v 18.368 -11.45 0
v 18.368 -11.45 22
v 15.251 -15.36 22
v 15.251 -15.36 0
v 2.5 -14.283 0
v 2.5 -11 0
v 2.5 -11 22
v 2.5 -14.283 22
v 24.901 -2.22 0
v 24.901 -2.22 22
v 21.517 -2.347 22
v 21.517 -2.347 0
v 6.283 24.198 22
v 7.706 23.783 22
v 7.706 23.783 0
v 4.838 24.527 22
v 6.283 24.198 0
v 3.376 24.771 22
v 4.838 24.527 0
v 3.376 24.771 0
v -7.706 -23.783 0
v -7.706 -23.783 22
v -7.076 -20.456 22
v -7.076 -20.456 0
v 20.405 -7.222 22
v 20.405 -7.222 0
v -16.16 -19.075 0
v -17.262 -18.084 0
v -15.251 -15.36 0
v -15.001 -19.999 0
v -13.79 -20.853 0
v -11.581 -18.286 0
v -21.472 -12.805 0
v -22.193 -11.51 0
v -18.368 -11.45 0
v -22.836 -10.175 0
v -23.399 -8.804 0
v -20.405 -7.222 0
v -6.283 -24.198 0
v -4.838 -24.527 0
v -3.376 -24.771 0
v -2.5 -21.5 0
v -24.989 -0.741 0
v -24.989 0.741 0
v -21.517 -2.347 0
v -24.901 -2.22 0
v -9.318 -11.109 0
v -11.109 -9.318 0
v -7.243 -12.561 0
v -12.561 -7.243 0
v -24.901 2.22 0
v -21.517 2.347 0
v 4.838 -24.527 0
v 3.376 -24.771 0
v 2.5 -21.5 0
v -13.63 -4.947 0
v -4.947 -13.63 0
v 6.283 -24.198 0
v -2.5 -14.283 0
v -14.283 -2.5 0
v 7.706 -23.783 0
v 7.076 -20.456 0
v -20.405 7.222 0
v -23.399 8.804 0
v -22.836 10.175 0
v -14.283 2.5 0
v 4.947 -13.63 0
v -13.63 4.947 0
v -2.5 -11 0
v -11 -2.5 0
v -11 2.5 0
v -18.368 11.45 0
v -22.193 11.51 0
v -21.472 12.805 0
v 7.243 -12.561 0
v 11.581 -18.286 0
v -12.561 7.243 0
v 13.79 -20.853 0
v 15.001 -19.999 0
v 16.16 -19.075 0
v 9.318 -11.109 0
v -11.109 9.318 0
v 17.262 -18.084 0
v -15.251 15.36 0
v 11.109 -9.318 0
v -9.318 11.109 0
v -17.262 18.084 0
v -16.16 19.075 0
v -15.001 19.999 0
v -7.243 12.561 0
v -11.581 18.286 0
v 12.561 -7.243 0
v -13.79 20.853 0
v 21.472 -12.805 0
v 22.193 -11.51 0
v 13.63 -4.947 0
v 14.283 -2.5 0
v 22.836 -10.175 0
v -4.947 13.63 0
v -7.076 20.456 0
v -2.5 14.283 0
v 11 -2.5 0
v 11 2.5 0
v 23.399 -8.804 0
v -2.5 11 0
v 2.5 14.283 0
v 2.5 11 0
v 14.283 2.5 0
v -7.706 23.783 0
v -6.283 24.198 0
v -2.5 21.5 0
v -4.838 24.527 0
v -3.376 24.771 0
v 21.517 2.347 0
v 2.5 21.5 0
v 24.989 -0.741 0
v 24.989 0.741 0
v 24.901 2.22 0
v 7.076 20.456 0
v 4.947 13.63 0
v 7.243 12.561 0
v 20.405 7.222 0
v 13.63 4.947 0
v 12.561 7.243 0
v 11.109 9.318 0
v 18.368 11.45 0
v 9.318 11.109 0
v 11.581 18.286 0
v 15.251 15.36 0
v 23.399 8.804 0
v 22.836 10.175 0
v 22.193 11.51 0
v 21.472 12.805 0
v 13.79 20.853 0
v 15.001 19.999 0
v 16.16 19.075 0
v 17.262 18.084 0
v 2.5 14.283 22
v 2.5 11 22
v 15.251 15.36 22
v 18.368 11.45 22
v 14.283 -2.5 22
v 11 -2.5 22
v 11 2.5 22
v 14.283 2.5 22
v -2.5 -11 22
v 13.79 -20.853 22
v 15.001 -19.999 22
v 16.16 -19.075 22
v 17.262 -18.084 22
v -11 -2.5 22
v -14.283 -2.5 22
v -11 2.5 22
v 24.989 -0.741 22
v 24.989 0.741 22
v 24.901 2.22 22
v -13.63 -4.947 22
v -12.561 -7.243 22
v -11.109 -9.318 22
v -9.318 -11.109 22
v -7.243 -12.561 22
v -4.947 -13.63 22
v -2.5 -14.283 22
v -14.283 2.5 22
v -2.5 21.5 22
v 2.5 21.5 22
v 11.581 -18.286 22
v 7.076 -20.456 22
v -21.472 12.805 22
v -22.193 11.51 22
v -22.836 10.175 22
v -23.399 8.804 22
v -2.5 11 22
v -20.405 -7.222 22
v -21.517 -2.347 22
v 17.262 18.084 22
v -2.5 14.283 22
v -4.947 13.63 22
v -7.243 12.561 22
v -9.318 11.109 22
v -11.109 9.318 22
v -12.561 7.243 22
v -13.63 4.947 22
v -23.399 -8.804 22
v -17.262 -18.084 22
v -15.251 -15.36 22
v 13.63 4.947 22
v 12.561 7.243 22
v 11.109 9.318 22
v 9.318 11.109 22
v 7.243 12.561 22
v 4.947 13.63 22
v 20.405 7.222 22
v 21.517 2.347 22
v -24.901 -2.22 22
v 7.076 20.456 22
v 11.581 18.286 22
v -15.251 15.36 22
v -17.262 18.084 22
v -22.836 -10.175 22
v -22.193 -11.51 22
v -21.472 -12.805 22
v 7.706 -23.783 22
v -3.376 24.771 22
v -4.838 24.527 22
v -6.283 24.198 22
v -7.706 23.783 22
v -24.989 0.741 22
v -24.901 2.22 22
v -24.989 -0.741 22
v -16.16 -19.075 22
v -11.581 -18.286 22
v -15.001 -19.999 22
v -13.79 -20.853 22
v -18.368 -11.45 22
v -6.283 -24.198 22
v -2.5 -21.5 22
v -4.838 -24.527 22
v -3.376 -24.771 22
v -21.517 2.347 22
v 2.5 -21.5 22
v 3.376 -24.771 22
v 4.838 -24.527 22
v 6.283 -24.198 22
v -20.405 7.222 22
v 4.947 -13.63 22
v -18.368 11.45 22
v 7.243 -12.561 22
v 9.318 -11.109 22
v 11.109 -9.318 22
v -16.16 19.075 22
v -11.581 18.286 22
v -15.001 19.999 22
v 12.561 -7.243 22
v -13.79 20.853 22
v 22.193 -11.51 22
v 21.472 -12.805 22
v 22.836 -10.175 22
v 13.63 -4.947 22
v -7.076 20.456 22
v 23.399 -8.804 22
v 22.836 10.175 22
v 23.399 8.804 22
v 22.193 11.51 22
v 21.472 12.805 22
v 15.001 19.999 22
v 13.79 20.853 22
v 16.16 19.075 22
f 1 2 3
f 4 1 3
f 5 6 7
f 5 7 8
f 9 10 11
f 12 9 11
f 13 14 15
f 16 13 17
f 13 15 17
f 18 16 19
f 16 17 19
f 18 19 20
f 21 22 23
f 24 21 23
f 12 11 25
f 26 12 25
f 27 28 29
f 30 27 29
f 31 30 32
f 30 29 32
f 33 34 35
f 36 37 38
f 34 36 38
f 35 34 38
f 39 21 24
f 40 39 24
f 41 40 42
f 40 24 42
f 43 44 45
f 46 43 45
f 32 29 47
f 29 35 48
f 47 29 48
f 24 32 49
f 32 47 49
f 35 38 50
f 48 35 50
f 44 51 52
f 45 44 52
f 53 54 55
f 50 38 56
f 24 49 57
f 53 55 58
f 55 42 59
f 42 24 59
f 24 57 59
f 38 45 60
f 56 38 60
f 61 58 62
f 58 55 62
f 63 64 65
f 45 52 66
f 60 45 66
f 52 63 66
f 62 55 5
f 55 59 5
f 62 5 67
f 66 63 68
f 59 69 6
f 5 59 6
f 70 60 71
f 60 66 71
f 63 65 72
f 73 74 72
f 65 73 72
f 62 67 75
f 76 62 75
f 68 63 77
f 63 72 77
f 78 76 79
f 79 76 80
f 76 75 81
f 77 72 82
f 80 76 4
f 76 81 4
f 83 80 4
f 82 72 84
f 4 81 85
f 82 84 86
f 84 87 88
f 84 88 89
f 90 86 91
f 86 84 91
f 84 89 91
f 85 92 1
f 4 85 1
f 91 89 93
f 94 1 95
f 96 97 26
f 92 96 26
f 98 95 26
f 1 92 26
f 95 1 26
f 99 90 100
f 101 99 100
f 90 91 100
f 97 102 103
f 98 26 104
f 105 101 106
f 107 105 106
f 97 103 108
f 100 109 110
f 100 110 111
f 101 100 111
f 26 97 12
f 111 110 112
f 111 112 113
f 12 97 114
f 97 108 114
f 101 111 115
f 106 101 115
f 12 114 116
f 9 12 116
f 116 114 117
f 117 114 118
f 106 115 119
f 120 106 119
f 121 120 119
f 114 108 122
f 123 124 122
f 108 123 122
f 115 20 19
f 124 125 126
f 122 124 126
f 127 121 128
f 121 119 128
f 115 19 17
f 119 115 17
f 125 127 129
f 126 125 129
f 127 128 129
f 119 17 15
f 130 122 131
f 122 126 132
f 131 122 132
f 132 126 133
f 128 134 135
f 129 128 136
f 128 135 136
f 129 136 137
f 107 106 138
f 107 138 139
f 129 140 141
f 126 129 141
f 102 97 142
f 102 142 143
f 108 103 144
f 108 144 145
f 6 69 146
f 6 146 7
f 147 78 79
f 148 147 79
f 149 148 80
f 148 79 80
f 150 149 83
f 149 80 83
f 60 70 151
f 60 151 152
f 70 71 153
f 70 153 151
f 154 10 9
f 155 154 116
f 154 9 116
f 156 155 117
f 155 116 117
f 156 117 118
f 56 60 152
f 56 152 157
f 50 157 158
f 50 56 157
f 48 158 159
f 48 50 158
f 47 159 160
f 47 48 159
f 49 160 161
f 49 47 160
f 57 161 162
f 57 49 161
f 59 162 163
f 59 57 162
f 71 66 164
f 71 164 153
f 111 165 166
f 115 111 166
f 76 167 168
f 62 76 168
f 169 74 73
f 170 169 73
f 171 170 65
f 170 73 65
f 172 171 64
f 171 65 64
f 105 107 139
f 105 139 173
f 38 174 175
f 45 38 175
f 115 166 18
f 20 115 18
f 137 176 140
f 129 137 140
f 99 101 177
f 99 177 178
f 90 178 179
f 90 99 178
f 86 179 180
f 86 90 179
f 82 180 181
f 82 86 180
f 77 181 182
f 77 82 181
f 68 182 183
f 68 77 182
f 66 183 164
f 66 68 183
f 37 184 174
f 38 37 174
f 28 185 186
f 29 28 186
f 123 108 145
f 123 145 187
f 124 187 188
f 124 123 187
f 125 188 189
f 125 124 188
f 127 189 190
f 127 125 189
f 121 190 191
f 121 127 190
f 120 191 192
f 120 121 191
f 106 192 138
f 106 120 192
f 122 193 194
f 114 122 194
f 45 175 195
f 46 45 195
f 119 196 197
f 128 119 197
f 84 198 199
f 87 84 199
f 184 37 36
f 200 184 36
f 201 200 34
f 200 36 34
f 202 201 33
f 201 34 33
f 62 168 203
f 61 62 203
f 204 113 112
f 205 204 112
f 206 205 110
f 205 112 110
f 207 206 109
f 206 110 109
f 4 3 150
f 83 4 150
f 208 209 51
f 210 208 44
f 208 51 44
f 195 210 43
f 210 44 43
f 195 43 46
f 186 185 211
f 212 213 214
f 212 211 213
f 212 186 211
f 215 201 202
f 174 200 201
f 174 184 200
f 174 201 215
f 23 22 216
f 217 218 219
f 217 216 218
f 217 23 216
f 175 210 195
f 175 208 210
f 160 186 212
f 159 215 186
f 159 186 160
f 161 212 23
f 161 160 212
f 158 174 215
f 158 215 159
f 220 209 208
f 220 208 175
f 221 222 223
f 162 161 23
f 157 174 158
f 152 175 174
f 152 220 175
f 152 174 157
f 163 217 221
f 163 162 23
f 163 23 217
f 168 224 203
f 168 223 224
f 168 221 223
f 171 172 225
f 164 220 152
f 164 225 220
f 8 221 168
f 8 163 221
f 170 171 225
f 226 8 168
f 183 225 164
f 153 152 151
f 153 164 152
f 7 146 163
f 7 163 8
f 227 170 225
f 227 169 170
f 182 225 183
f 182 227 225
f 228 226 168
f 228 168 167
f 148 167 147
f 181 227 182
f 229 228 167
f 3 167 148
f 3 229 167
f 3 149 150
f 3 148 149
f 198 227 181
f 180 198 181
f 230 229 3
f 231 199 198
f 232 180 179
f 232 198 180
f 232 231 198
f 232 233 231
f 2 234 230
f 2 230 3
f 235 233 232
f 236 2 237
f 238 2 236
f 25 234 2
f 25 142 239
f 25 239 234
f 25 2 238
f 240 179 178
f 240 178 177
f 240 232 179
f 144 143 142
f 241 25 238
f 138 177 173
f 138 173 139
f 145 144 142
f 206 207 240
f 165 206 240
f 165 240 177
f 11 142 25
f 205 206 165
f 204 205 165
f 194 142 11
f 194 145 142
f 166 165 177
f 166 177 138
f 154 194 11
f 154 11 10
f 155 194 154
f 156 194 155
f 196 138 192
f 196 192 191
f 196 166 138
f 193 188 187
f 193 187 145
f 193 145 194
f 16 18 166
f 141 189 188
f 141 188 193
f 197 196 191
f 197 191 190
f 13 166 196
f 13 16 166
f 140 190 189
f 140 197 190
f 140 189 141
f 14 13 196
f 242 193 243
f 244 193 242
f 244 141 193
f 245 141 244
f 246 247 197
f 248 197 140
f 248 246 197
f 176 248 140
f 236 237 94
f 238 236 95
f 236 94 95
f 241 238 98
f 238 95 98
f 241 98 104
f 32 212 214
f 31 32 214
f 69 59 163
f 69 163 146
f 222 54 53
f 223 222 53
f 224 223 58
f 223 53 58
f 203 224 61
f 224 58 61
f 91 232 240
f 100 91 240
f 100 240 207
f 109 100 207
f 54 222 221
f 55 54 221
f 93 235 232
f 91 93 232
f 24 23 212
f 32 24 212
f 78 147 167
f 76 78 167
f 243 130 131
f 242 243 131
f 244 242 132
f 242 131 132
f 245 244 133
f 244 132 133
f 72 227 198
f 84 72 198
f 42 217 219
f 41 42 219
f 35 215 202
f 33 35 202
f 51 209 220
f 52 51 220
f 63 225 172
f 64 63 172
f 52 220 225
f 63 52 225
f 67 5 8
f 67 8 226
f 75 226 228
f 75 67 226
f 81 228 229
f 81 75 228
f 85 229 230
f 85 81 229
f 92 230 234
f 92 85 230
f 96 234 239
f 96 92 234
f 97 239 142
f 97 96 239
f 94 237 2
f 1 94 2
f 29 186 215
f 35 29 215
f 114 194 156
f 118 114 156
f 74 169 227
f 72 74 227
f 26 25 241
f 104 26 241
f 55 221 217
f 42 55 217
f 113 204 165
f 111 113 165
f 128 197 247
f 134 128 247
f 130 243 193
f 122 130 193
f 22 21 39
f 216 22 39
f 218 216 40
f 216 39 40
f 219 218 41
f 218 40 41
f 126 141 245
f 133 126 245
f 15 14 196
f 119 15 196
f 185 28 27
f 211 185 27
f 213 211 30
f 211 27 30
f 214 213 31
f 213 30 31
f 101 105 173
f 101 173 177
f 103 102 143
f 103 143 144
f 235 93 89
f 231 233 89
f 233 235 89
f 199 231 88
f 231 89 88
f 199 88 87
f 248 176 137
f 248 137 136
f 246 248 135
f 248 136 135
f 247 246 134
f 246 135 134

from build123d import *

# Parameters (mm, degrees)
ESBO_O1_R                  = 25
RESSALTO_EXTRUS_O1_DEPTH   = 22
CORTE_EXTRUS_O1_DEPTH      = 24
CORTE_EXTRUS_O1_DEPTH_BACK = 32
CORTE_EXTRUS_O2_DEPTH      = 32
PADR_OCIRCULAR1_COUNT      = 14


with BuildPart() as part:
    # Esboço1 → Ressalto-extrusão1 (new body)
    with BuildSketch(Plane.XY):
        Circle(ESBO_O1_R)
    extrude(amount=RESSALTO_EXTRUS_O1_DEPTH)

    # Esboço2 → Corte-extrusão1 (cut, two sides: drawn at the far end of the back side and taken through both)
    with BuildSketch(Plane.XY.offset(22).offset(-CORTE_EXTRUS_O1_DEPTH_BACK)):
        with BuildLine():
            Line((-2.5, -11), (2.5, -11))
            Line((2.5, -11), (2.5, -14.282856857))
            ThreePointArc((2.5, -14.282856857), (10.253048327, -10.253048327), (14.282856857, -2.5))
            Line((14.282856857, -2.5), (11, -2.5))
            Line((11, -2.5), (11, 2.5))
            Line((11, 2.5), (14.282856857, 2.5))
            ThreePointArc((14.282856857, 2.5), (10.253048327, 10.253048327), (2.5, 14.282856857))
            Line((2.5, 14.282856857), (2.5, 11))
            Line((2.5, 11), (-2.5, 11))
            Line((-2.5, 11), (-2.5, 14.282856857))
            ThreePointArc((-2.5, 14.282856857), (-10.253048327, 10.253048327), (-14.282856857, 2.5))
            Line((-14.282856857, 2.5), (-11, 2.5))
            Line((-11, 2.5), (-11, -2.5))
            Line((-11, -2.5), (-14.282856857, -2.5))
            ThreePointArc((-14.282856857, -2.5), (-10.253048327, -10.253048327), (-2.5, -14.282856857))
            Line((-2.5, -14.282856857), (-2.5, -11))
        make_face()
    extrude(amount=CORTE_EXTRUS_O1_DEPTH + CORTE_EXTRUS_O1_DEPTH_BACK, mode=Mode.SUBTRACT)

    # Esboço3 → Corte-extrusão2 (cut)
    with BuildSketch(Plane.XY.offset(22)):
        Polygon((-3.376446492, -24.770942838), (0.890947549, -26.390974492), (3.376446492, -24.770942838), (2.5, -21.5), (-2.5, -21.5), align=None)
    corte_extrus_o2 = extrude(amount=-CORTE_EXTRUS_O2_DEPTH, mode=Mode.SUBTRACT)

    # PadrãoCircular1: Corte-extrusão2 ×14 about axis
    padr_ocircular1_axis = Axis((0, 0, 0), (0, 0, 1))
    for i in range(1, PADR_OCIRCULAR1_COUNT):
        add(corte_extrus_o2.rotate(padr_ocircular1_axis, i * 360 / PADR_OCIRCULAR1_COUNT), mode=Mode.SUBTRACT)


solid = part.part
